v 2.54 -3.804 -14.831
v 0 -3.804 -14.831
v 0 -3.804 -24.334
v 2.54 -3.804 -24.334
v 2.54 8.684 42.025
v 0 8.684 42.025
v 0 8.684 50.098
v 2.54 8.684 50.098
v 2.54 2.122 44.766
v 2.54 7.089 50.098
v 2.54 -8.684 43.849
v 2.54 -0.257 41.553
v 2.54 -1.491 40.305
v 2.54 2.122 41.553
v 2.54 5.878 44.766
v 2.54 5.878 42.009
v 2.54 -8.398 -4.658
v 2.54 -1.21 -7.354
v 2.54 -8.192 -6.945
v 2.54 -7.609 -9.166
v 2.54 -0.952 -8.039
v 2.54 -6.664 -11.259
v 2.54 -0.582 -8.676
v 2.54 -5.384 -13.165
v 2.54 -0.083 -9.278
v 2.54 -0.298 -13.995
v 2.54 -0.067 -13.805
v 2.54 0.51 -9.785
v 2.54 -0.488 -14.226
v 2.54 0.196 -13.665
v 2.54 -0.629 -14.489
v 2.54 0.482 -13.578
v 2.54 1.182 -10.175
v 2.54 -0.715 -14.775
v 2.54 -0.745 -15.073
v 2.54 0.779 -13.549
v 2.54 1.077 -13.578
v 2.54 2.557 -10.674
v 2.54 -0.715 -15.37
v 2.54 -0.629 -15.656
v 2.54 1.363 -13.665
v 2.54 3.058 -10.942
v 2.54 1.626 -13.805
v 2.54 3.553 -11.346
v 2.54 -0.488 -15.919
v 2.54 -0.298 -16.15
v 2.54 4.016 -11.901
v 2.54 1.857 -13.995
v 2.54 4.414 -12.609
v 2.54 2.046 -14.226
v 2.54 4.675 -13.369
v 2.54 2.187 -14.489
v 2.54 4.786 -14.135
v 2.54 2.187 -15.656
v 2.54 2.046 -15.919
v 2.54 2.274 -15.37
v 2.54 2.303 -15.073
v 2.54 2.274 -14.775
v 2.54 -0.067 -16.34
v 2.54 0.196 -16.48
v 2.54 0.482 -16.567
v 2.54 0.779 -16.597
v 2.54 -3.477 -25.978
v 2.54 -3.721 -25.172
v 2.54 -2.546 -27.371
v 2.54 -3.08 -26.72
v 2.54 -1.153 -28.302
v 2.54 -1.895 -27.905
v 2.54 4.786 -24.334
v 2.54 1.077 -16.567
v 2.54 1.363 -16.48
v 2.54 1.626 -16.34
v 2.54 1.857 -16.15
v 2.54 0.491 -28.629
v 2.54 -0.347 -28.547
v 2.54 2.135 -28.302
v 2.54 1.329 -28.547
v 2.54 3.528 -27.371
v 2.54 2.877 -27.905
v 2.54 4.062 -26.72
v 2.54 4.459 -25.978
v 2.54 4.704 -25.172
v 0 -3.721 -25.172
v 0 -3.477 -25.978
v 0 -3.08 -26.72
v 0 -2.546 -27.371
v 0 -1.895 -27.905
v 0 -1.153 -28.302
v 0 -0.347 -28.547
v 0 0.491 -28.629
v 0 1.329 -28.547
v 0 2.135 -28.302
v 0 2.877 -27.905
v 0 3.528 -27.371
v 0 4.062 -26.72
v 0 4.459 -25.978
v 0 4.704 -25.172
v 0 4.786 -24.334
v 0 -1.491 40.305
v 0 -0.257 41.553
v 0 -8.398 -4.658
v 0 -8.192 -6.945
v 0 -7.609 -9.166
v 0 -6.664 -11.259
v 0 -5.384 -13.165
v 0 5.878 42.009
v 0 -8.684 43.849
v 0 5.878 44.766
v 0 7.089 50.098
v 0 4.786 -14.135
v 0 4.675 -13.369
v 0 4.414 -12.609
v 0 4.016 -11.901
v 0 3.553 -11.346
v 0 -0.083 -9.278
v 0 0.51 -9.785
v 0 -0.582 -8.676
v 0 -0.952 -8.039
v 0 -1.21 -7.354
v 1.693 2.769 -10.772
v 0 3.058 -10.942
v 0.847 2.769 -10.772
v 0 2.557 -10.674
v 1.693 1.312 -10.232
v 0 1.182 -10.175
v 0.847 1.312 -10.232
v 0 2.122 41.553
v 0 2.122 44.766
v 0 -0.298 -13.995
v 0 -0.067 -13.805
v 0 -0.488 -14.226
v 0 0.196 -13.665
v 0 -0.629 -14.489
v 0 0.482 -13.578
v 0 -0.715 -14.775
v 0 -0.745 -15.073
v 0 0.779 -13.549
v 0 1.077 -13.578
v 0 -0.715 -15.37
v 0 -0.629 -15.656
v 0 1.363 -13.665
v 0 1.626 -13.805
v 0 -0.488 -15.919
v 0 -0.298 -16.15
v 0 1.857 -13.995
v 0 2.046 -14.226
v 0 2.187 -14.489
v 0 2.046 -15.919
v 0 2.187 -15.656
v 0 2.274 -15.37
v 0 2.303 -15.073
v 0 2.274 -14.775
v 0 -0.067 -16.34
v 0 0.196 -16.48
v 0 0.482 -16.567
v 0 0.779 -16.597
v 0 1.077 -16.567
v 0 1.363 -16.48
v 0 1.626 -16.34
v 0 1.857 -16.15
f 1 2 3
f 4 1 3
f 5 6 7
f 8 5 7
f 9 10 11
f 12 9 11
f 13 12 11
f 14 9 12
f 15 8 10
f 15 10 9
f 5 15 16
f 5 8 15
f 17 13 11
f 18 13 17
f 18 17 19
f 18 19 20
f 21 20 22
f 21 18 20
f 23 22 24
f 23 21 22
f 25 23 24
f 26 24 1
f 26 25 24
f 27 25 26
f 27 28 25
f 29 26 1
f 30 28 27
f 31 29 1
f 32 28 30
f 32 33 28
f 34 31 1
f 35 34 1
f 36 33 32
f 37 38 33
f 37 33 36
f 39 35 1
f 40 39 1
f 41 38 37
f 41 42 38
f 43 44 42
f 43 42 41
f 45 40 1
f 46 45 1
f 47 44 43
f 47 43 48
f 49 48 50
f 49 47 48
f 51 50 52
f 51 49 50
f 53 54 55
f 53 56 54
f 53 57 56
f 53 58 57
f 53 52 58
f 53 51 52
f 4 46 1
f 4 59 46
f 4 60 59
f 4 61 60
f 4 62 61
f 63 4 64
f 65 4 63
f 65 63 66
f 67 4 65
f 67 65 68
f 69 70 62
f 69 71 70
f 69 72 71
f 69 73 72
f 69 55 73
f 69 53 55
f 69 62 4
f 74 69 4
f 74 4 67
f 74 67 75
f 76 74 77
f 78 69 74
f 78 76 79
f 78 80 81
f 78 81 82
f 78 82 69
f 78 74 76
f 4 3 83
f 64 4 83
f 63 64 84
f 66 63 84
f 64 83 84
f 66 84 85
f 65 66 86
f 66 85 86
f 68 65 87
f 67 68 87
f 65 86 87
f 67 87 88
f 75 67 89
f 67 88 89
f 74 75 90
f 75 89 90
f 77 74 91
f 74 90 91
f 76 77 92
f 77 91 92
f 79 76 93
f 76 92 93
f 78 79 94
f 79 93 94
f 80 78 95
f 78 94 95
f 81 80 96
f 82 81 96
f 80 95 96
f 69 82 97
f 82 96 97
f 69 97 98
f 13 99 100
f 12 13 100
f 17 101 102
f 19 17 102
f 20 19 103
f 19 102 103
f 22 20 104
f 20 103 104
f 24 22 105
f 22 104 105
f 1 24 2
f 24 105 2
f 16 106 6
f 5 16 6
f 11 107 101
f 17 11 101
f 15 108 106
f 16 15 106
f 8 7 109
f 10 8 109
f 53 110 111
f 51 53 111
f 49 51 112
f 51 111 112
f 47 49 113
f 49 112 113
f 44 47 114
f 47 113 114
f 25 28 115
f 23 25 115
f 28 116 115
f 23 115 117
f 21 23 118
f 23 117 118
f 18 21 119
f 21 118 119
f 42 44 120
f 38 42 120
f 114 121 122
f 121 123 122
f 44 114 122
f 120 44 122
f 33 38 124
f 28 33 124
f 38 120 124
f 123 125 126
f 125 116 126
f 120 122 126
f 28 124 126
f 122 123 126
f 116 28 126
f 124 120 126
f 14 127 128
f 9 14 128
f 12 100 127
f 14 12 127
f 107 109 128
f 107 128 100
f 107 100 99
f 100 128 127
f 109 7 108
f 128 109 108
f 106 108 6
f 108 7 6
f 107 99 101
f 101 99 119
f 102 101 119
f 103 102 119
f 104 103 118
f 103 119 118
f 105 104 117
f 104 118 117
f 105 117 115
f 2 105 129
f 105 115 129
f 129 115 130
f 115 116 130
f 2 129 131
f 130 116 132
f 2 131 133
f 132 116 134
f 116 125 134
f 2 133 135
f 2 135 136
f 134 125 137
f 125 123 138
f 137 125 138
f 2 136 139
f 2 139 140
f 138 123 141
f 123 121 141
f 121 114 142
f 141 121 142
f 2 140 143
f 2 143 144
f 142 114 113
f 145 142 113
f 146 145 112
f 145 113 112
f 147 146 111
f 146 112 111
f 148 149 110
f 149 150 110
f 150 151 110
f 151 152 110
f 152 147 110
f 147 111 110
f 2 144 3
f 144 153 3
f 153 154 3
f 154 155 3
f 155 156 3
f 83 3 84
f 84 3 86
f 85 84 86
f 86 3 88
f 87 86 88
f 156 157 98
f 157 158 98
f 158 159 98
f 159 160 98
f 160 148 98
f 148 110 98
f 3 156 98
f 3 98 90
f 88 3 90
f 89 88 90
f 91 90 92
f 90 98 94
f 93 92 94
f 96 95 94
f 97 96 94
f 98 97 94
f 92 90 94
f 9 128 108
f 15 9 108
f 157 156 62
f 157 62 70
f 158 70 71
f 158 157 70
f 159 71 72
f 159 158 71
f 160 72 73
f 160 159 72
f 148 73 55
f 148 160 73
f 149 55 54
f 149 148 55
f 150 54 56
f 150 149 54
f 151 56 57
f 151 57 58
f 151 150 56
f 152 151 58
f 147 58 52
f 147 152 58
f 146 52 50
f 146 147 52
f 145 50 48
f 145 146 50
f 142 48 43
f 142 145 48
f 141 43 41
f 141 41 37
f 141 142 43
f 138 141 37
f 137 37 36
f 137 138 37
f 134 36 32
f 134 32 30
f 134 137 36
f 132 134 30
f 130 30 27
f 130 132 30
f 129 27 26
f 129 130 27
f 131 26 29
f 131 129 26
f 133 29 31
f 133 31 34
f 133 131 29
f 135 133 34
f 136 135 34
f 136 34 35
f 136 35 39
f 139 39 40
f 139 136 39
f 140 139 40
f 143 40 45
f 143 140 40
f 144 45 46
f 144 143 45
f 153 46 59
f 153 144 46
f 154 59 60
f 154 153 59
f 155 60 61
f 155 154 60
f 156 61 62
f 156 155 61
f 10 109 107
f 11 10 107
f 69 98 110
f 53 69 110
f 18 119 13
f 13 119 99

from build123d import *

# Parameters (mm, degrees)
SKETCH1_R           = 1.524
BOSS_EXTRUDE1_DEPTH = 2.54


with BuildPart() as part:
    # Sketch1 → Boss-Extrude1 (new body)
    with BuildSketch(Plane(origin=(0, 0, 0), x_dir=(0, 0, -1), z_dir=(1, 0, 0))):
        with BuildLine():
            Line((-50.098445601, 7.088580138), (-43.849100544, -8.683576435))
            Line((-43.849100544, -8.683576435), (4.658436215, -8.397602077))
            ThreePointArc((4.658436215, -8.397602077), (10.232240609, -7.180288327), (14.831146716, -3.804016594))
            Line((14.831146716, -3.804016594), (24.334060944, -3.804016594))
            ThreePointArc((24.334060944, -3.804016594), (28.629205553, 0.491128014), (24.334060944, 4.786272622))
            Line((24.334060944, 4.786272622), (14.134590219, 4.786272622))
            add(Edge.make_bspline(
                [(14.134590219, 4.786272622), (12.843386165, 4.731447756), (10.814047052, 3.6607913), (10.165897568, 0.480505822), (8.613444363, -0.857594594), (7.353623418, -1.210119508)],
                knots=[0, 0, 0, 0, 0.42442334, 0.587762542, 1, 1, 1, 1], degree=3))
            Line((7.353623418, -1.210119508), (-40.305133261, -1.491089915))
            Line((-40.305133261, -1.491089915), (-41.553433836, -0.257421693))
            Line((-41.553433836, -0.257421693), (-41.553433836, 2.122185781))
            Line((-41.553433836, 2.122185781), (-44.766052446, 2.122185781))
            Line((-44.766052446, 2.122185781), (-44.766052446, 5.877981651))
            Line((-44.766052446, 5.877981651), (-42.008654347, 5.877981651))
            Line((-42.008654347, 5.877981651), (-42.025194626, 8.683576435))
            Line((-42.025194626, 8.683576435), (-50.098445601, 8.683576435))
            Line((-50.098445601, 8.683576435), (-50.098445601, 7.088580138))
        make_face()
        with Locations((15.07250618, 0.779338165)):
            Circle(SKETCH1_R, mode=Mode.SUBTRACT)
    extrude(amount=BOSS_EXTRUDE1_DEPTH)


solid = part.part
